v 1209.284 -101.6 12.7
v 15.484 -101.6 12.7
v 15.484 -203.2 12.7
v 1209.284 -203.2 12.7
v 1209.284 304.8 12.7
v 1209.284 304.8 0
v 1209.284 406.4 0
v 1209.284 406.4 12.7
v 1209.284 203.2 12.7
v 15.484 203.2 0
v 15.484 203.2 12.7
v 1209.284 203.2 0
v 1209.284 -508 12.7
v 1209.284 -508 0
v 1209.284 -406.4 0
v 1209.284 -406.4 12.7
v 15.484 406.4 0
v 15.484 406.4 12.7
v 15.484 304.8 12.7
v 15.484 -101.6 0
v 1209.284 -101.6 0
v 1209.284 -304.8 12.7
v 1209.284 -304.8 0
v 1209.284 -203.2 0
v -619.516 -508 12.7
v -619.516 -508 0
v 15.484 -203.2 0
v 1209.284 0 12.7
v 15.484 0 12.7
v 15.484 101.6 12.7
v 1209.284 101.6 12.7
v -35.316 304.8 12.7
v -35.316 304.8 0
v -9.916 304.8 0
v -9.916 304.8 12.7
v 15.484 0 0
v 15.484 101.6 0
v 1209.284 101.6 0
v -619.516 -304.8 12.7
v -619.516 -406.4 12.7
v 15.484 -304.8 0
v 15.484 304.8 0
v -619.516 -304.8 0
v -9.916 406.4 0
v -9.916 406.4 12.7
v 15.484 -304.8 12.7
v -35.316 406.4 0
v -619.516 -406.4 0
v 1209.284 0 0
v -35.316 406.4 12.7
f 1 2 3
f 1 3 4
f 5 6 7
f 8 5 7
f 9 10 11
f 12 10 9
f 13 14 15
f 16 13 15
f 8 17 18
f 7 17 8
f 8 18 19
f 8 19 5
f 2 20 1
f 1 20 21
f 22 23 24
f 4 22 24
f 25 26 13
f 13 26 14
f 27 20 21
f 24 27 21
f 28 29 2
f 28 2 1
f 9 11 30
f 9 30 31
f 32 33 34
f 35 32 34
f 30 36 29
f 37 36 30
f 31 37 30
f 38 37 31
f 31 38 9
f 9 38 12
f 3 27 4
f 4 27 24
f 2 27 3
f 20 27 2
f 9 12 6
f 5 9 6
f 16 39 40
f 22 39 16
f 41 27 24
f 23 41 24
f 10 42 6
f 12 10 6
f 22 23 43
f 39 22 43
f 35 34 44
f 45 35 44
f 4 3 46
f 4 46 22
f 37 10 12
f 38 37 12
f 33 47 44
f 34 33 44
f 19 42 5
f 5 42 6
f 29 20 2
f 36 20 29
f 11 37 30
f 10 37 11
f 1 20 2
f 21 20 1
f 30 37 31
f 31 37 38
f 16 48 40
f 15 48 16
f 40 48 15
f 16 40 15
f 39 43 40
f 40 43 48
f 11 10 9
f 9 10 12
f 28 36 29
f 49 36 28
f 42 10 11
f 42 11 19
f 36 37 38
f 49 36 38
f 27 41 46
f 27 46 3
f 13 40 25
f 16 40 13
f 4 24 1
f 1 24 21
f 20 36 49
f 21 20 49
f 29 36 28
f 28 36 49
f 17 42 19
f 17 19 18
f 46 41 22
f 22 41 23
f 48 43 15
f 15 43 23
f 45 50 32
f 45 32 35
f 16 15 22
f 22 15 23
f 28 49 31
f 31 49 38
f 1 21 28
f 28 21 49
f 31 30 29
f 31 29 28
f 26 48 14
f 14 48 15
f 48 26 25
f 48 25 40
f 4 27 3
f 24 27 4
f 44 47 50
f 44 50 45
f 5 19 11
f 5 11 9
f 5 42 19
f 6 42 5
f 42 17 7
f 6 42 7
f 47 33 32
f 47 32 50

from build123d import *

# Parameters (mm, degrees)
F0_W      = 1193.8
F0_H      = 101.6
F1_DEPTH  = 12.7
F2_DEPTH  = 12.7
F3_DEPTH  = 12.7
F4_DEPTH  = 12.7
F5_DEPTH  = 12.7
F6_DEPTH  = 12.7
F7_DEPTH  = 12.7
F8_DEPTH  = 12.7
F0_W_2    = 1828.8
F9_DEPTH  = 12.7
F0_W_3    = 25.4
F10_DEPTH = 12.7


with BuildPart() as f1:
    # F0 (on Top) → F1 (new body)
    with BuildSketch(Plane.XY):
        with Locations((612.3837251917, 355.6)):
            Rectangle(F0_W, F0_H)
    extrude(amount=F1_DEPTH)


with BuildPart() as f2:
    # F0 (on Top) → F2 (new body)
    with BuildSketch(Plane.XY):
        with Locations((612.3837251917, 254)):
            Rectangle(F0_W, F0_H)
    extrude(amount=F2_DEPTH)


with BuildPart() as f3:
    # F0 (on Top) → F3 (new body)
    with BuildSketch(Plane.XY):
        with Locations((612.3837251917, 152.4)):
            Rectangle(F0_W, F0_H)
    extrude(amount=F3_DEPTH)


with BuildPart() as f4:
    # F0 (on Top) → F4 (new body)
    with BuildSketch(Plane.XY):
        with Locations((612.3837251917, 50.8)):
            Rectangle(F0_W, F0_H)
    extrude(amount=F4_DEPTH)


with BuildPart() as f5:
    # F0 (on Top) → F5 (new body)
    with BuildSketch(Plane.XY):
        with Locations((612.3837251917, -50.8)):
            Rectangle(F0_W, F0_H)
    extrude(amount=F5_DEPTH)


with BuildPart() as f6:
    # F0 (on Top) → F6 (new body)
    with BuildSketch(Plane.XY):
        with Locations((612.3837251917, -152.4)):
            Rectangle(F0_W, F0_H)
    extrude(amount=F6_DEPTH)


with BuildPart() as f7:
    # F0 (on Top) → F7 (new body)
    with BuildSketch(Plane.XY):
        with Locations((612.3837251917, -254)):
            Rectangle(F0_W, F0_H)
    extrude(amount=F7_DEPTH)


with BuildPart() as f8:
    # F0 (on Top) → F8 (new body)
    with BuildSketch(Plane.XY):
        Polygon((-9.9162748083, -304.8), (-35.3162748083, -304.8), (-619.5162748083, -304.8), (-619.5162748083, -406.4), (1209.2837251917, -406.4), (1209.2837251917, -304.8), (15.4837251917, -304.8), align=None)
    extrude(amount=F8_DEPTH)


with BuildPart() as f9:
    # F0 (on Top) → F9 (new body)
    with BuildSketch(Plane.XY):
        with Locations((294.8837251917, -457.2)):
            Rectangle(F0_W_2, F0_H)
    extrude(amount=F9_DEPTH)


with BuildPart() as f10:
    # F0 (on Top) → F10 (new body)
    with BuildSketch(Plane.XY):
        with Locations((-22.6162748083, 355.6)):
            Rectangle(F0_W_3, F0_H)
    extrude(amount=F10_DEPTH)


solid = Compound([f1.part, f2.part, f3.part, f4.part, f5.part, f6.part, f7.part, f8.part, f9.part, f10.part])
